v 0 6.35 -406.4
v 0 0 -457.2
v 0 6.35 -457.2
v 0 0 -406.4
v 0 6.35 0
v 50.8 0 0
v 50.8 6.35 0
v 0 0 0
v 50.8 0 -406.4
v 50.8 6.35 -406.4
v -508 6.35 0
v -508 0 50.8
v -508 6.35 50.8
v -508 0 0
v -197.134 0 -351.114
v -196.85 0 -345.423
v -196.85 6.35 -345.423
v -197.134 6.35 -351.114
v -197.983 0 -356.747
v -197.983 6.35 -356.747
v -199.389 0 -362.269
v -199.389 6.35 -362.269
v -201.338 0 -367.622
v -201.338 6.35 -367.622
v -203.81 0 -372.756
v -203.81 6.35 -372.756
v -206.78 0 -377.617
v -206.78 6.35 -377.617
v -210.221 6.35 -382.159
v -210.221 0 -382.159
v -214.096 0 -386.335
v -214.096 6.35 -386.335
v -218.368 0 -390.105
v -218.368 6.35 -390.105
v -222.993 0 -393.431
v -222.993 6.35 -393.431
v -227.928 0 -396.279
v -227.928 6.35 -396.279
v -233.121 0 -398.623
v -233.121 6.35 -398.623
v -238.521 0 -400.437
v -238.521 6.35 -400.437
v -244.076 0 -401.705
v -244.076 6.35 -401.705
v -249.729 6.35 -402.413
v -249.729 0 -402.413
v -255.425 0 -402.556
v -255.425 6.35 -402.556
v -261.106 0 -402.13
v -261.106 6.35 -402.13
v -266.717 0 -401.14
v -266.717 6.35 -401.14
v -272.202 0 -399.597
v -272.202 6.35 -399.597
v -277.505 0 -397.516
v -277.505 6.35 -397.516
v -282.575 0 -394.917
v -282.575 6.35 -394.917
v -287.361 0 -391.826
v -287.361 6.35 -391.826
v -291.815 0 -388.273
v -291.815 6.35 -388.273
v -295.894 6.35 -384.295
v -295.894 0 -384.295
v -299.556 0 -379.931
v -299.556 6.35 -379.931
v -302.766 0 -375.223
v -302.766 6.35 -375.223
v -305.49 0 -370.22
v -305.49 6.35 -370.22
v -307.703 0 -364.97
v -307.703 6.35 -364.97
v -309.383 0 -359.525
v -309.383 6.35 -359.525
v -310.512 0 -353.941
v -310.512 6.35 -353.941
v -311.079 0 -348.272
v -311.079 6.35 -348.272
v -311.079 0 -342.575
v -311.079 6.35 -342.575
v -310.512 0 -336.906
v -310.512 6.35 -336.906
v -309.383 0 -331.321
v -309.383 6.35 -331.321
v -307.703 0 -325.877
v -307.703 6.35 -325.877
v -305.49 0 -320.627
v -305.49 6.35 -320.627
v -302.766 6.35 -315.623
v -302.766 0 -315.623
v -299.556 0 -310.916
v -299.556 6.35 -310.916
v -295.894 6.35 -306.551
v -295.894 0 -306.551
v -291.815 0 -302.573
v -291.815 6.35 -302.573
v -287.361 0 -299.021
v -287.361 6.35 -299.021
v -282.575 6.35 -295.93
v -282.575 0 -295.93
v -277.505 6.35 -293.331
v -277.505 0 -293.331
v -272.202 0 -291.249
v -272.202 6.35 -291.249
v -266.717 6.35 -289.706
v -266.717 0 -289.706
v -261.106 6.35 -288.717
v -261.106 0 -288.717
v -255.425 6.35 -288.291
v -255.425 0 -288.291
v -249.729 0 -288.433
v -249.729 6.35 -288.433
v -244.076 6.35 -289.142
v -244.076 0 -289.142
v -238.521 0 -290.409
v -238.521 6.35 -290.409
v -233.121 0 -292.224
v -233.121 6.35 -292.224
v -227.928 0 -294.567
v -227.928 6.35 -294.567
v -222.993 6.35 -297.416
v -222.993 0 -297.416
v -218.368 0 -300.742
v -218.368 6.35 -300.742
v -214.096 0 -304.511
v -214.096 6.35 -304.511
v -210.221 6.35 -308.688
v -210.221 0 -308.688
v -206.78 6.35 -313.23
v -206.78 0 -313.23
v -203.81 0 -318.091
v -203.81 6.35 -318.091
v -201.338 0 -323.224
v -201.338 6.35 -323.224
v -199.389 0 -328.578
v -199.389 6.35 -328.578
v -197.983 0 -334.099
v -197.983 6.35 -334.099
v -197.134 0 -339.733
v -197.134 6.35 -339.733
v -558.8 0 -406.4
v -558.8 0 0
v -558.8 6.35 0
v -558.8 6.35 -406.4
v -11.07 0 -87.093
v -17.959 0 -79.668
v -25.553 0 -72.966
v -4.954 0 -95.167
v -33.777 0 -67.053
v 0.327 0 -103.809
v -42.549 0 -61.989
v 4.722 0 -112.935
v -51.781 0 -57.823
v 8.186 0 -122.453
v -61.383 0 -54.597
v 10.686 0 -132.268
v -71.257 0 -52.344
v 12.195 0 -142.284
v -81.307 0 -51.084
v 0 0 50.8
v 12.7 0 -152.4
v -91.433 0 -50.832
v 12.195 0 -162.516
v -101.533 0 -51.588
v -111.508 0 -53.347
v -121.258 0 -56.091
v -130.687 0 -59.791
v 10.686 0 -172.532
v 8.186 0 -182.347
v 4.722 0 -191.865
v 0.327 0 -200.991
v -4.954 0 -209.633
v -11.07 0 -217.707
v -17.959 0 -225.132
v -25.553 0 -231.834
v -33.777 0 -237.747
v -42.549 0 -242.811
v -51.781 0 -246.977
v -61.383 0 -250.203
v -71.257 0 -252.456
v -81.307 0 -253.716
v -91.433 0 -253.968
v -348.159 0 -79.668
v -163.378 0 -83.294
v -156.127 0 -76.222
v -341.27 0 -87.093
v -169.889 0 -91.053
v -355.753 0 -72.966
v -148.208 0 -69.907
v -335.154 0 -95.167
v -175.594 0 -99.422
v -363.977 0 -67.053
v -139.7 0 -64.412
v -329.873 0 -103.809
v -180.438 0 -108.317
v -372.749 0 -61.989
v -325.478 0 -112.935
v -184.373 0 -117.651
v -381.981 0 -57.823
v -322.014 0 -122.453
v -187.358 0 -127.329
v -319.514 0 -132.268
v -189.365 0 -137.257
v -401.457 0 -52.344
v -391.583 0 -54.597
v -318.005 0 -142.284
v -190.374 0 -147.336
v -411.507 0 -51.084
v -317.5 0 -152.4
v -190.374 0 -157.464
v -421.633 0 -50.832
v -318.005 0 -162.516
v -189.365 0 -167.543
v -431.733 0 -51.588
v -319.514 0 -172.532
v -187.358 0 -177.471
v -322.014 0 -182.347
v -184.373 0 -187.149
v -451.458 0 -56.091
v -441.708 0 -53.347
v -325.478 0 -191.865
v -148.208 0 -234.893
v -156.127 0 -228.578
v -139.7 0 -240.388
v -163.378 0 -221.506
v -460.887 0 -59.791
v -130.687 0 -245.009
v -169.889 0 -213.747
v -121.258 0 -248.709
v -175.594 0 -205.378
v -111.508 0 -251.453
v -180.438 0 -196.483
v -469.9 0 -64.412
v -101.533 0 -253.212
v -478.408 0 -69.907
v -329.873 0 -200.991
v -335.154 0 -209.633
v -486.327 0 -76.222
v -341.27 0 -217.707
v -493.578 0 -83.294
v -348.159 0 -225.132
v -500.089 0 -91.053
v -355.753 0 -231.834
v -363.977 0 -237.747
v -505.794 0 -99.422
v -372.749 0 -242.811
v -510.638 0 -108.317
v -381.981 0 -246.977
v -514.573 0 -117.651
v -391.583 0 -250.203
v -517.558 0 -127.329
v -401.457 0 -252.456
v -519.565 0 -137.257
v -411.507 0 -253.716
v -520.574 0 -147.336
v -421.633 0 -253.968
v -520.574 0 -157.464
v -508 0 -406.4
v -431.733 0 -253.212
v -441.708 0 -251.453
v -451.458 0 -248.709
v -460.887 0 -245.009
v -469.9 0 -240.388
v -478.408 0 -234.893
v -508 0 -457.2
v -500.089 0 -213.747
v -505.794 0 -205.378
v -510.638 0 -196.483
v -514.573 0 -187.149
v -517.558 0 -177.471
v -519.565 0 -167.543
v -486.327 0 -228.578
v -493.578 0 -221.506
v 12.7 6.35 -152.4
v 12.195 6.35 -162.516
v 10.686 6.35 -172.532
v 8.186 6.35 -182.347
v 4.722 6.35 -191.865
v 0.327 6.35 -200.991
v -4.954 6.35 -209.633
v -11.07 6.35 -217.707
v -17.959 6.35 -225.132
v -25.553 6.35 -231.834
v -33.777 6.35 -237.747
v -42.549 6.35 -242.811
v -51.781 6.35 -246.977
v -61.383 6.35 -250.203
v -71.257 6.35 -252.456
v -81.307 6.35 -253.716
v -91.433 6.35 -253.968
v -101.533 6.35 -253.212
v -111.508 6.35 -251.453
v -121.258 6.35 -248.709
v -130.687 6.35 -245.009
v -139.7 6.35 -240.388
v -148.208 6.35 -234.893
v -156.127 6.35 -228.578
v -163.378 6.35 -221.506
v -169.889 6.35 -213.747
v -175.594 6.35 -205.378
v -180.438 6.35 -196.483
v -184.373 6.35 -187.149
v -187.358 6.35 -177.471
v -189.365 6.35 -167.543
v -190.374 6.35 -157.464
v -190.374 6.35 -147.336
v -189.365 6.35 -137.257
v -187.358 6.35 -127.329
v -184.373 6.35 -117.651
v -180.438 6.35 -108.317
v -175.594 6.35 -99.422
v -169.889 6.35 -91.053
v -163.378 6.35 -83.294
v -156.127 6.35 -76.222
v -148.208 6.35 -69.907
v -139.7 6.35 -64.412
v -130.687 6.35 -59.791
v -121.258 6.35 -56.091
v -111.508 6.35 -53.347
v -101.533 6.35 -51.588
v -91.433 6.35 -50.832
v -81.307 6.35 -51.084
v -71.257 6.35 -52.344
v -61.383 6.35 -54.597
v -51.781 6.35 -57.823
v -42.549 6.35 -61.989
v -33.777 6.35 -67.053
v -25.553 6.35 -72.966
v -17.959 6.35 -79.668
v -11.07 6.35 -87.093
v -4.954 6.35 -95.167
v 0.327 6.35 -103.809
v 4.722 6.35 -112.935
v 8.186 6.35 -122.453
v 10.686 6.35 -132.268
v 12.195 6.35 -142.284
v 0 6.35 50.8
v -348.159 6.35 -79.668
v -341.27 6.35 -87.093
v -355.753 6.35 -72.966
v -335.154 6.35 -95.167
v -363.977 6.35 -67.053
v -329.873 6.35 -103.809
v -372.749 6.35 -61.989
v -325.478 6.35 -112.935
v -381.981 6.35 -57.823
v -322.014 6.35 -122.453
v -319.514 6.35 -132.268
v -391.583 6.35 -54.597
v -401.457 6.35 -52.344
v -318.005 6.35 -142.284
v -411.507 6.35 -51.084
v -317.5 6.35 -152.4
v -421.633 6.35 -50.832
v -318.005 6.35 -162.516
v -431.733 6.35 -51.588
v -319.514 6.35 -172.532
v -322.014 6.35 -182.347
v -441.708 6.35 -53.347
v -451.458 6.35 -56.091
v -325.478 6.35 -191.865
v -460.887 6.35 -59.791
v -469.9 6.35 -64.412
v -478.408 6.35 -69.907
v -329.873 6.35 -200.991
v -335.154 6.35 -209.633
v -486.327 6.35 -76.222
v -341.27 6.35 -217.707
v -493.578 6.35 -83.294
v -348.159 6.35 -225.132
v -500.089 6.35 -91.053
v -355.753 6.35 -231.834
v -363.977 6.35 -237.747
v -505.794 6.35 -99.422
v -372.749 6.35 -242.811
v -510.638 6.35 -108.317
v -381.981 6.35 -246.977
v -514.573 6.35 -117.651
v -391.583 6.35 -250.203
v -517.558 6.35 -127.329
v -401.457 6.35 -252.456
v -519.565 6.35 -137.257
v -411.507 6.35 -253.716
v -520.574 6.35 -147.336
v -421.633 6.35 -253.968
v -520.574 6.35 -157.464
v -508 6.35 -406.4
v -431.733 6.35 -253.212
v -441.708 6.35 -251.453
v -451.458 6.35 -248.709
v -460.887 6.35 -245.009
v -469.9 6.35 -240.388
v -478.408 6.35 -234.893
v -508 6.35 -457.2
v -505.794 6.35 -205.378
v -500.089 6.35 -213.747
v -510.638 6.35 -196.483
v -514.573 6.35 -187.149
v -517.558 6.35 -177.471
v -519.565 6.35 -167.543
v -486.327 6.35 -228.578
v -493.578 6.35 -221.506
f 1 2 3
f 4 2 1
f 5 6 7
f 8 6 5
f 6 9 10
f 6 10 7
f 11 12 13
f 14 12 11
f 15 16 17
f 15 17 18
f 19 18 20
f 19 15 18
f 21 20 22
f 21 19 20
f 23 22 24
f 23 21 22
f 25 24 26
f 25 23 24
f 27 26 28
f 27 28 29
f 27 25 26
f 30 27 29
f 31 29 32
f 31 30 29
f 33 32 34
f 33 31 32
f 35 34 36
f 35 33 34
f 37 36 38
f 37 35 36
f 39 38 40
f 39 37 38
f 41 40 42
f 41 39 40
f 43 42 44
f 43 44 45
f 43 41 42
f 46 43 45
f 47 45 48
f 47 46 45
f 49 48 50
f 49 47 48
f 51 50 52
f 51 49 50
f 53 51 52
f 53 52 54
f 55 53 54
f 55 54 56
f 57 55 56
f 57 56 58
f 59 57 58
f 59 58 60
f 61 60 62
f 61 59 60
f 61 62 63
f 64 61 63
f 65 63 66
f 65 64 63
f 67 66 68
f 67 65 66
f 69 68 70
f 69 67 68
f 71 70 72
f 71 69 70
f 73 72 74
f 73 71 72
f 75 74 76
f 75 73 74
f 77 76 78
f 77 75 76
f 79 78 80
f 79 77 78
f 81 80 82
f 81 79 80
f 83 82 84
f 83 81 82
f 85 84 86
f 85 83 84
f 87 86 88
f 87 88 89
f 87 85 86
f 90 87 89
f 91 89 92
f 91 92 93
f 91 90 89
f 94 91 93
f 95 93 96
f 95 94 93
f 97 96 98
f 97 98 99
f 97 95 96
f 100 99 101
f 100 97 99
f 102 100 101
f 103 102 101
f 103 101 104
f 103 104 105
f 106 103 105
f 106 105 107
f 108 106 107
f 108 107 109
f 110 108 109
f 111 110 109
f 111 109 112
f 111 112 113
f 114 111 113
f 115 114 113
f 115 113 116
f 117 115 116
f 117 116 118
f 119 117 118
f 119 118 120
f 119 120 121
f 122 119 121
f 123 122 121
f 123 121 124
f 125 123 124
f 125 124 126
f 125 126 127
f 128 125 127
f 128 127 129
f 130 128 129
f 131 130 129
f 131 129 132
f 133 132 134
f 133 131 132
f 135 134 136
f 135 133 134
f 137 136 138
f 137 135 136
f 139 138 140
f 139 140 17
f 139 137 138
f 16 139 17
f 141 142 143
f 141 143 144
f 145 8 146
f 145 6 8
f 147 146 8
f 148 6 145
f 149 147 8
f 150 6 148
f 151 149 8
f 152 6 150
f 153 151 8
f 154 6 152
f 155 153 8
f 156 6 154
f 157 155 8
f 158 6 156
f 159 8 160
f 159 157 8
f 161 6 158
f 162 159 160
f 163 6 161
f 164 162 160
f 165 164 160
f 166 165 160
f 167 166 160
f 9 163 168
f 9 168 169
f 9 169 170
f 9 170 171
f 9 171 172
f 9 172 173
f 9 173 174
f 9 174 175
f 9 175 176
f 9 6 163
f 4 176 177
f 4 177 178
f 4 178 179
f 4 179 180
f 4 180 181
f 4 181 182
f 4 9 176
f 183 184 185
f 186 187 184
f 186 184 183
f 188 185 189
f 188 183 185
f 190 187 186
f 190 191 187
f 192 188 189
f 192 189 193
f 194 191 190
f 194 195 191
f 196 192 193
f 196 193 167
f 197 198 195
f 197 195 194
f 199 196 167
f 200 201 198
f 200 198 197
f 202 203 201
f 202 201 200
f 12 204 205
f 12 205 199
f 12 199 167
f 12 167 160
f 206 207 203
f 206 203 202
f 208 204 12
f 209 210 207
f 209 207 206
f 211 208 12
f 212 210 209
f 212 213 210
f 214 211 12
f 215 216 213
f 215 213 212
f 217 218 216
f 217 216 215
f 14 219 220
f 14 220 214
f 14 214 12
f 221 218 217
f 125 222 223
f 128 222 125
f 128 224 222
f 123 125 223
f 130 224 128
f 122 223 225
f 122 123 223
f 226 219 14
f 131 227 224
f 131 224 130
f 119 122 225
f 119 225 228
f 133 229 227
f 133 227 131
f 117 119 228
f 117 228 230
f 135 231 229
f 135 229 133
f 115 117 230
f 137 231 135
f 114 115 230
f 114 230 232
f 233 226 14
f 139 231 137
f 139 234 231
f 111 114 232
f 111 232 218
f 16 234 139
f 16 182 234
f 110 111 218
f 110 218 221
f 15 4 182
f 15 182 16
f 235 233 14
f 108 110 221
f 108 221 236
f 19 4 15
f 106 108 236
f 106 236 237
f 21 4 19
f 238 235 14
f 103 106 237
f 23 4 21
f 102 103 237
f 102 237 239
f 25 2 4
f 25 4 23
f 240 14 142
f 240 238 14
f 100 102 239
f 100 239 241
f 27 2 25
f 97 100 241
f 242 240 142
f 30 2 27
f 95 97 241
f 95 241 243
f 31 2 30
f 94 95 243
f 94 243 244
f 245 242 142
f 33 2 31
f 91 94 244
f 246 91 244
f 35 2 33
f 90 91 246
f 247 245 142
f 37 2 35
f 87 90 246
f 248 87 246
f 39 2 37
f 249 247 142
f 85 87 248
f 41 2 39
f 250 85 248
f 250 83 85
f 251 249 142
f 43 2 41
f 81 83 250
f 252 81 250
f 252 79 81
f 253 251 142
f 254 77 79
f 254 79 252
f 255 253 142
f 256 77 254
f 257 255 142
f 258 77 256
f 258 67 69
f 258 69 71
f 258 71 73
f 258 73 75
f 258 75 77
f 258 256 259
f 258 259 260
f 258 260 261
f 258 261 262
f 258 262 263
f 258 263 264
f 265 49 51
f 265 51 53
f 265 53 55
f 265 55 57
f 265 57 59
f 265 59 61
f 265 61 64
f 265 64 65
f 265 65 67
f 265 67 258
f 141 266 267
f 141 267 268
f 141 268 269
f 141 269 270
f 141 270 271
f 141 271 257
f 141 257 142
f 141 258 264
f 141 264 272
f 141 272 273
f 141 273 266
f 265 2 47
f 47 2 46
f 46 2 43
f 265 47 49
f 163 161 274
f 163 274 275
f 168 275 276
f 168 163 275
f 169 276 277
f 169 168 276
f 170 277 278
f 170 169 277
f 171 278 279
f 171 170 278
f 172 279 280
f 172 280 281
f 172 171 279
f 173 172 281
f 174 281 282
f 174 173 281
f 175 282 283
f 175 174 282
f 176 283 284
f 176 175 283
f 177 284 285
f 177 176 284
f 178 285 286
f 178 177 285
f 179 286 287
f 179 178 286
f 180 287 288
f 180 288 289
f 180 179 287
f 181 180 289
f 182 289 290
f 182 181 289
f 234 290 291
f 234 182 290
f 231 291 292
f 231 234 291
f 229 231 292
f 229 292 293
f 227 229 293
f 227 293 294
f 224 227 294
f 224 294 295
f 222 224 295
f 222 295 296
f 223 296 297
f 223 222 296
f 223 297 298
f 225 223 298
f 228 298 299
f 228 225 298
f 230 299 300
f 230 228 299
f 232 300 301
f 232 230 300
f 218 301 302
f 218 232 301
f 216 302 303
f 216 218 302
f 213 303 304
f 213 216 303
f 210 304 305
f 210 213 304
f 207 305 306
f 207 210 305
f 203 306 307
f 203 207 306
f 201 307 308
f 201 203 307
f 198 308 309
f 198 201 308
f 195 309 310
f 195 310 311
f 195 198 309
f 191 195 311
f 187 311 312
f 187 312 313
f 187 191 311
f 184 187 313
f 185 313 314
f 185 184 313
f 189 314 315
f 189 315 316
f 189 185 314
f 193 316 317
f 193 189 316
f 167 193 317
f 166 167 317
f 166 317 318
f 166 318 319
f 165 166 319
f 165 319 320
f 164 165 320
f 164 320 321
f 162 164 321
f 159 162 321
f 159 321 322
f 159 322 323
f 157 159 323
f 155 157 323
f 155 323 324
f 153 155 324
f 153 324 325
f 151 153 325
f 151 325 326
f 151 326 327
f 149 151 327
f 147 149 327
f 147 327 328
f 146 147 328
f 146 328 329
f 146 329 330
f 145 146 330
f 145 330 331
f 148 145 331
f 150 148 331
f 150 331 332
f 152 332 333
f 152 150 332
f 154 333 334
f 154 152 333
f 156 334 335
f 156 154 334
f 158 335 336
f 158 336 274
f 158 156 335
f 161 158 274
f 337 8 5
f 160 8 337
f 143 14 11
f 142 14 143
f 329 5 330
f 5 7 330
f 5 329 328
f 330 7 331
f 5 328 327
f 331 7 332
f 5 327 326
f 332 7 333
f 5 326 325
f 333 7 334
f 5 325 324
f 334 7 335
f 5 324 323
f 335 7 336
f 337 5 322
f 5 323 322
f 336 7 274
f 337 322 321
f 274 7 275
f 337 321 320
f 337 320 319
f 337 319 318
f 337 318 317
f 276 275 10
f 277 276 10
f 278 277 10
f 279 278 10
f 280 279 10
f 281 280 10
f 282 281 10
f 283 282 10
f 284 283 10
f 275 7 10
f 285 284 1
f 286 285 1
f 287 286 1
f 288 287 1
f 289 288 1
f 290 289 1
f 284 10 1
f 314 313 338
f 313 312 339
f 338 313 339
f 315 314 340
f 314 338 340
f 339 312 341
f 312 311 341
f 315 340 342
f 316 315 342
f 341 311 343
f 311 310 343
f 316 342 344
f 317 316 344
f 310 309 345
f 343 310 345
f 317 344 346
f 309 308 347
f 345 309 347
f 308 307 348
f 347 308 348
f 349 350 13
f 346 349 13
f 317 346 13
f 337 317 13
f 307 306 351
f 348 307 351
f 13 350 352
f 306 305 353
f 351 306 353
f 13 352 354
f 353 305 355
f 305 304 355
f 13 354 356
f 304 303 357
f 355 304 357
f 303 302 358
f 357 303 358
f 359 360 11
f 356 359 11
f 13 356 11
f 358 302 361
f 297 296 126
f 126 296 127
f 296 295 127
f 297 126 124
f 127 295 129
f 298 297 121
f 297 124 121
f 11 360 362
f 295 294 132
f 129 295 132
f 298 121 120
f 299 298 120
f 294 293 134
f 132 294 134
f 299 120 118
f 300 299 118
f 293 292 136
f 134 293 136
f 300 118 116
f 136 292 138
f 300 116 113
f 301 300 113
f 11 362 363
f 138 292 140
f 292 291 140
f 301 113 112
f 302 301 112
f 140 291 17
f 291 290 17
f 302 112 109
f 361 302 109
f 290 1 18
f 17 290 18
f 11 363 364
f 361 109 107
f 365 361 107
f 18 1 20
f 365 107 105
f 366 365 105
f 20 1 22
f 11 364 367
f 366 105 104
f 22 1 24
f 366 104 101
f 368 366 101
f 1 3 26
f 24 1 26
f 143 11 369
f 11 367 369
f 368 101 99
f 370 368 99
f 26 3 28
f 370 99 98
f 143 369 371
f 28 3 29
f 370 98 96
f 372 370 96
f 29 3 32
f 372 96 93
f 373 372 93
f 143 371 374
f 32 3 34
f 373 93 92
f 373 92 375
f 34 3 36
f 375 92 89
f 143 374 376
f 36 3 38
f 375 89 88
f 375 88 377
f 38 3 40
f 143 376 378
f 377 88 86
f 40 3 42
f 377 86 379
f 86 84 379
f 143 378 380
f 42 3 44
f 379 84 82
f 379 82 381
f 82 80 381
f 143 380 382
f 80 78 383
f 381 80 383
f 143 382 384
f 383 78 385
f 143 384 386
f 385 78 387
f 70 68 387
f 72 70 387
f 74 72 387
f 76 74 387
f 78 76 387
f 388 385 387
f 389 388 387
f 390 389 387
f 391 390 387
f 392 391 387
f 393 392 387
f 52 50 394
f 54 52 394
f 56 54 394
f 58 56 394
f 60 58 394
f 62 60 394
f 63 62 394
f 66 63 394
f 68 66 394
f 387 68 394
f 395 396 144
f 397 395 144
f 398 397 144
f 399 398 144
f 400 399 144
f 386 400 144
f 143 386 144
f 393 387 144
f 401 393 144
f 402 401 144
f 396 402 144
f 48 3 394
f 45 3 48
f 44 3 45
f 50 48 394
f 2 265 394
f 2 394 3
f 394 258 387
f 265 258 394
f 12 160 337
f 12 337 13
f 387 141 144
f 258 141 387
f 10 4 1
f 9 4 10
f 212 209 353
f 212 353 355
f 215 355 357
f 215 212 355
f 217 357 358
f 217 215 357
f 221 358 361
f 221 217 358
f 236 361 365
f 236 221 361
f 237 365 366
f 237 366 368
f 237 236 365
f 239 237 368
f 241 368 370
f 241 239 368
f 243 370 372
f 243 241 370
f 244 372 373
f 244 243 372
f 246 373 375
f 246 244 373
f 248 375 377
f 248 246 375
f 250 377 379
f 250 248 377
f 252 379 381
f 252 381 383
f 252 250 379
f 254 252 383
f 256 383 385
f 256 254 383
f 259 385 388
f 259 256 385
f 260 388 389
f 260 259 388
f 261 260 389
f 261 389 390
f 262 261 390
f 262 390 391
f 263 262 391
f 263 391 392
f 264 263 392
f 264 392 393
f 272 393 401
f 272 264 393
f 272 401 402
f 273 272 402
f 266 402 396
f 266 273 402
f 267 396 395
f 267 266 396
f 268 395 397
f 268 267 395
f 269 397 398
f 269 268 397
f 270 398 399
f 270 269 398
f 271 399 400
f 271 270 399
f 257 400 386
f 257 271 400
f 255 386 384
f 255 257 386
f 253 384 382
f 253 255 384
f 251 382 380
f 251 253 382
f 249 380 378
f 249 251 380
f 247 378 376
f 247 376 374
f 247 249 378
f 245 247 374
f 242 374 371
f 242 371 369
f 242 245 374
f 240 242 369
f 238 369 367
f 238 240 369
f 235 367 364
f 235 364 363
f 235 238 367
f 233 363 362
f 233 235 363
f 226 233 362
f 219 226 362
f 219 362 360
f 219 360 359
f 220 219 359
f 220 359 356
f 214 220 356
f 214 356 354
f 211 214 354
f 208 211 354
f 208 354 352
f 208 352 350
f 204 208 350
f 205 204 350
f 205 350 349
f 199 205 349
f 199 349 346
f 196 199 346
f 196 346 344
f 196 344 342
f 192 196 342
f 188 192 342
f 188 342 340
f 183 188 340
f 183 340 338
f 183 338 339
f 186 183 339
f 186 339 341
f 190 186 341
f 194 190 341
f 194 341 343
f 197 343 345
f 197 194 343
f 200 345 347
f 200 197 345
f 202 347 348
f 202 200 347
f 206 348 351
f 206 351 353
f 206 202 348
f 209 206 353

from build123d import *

# Parameters (mm, degrees)
SKETCH1_R           = 101.6
SKETCH1_R_2         = 57.15
BOSS_EXTRUDE1_DEPTH = 6.35


with BuildPart() as part:
    # Sketch1 → Boss-Extrude1 (new body)
    with BuildSketch(Plane(origin=(0, 0, 0), x_dir=(1, 0, 0), z_dir=(0, 1, 0))):
        Polygon((0, 0), (0, -50.8), (-508, -50.8), (-508, 0), (-558.8, 0), (-558.8, 406.4), (-508, 406.4), (-508, 457.2), (0, 457.2), (0, 406.4), (50.8, 406.4), (50.8, 0), align=None)
        with Locations((-419.1, 152.4)):
            Circle(SKETCH1_R, mode=Mode.SUBTRACT)
        with Locations((-88.9, 152.4)):
            Circle(SKETCH1_R, mode=Mode.SUBTRACT)
        with Locations((-254, 345.42328875)):
            Circle(SKETCH1_R_2, mode=Mode.SUBTRACT)
    extrude(amount=BOSS_EXTRUDE1_DEPTH)


solid = part.part
